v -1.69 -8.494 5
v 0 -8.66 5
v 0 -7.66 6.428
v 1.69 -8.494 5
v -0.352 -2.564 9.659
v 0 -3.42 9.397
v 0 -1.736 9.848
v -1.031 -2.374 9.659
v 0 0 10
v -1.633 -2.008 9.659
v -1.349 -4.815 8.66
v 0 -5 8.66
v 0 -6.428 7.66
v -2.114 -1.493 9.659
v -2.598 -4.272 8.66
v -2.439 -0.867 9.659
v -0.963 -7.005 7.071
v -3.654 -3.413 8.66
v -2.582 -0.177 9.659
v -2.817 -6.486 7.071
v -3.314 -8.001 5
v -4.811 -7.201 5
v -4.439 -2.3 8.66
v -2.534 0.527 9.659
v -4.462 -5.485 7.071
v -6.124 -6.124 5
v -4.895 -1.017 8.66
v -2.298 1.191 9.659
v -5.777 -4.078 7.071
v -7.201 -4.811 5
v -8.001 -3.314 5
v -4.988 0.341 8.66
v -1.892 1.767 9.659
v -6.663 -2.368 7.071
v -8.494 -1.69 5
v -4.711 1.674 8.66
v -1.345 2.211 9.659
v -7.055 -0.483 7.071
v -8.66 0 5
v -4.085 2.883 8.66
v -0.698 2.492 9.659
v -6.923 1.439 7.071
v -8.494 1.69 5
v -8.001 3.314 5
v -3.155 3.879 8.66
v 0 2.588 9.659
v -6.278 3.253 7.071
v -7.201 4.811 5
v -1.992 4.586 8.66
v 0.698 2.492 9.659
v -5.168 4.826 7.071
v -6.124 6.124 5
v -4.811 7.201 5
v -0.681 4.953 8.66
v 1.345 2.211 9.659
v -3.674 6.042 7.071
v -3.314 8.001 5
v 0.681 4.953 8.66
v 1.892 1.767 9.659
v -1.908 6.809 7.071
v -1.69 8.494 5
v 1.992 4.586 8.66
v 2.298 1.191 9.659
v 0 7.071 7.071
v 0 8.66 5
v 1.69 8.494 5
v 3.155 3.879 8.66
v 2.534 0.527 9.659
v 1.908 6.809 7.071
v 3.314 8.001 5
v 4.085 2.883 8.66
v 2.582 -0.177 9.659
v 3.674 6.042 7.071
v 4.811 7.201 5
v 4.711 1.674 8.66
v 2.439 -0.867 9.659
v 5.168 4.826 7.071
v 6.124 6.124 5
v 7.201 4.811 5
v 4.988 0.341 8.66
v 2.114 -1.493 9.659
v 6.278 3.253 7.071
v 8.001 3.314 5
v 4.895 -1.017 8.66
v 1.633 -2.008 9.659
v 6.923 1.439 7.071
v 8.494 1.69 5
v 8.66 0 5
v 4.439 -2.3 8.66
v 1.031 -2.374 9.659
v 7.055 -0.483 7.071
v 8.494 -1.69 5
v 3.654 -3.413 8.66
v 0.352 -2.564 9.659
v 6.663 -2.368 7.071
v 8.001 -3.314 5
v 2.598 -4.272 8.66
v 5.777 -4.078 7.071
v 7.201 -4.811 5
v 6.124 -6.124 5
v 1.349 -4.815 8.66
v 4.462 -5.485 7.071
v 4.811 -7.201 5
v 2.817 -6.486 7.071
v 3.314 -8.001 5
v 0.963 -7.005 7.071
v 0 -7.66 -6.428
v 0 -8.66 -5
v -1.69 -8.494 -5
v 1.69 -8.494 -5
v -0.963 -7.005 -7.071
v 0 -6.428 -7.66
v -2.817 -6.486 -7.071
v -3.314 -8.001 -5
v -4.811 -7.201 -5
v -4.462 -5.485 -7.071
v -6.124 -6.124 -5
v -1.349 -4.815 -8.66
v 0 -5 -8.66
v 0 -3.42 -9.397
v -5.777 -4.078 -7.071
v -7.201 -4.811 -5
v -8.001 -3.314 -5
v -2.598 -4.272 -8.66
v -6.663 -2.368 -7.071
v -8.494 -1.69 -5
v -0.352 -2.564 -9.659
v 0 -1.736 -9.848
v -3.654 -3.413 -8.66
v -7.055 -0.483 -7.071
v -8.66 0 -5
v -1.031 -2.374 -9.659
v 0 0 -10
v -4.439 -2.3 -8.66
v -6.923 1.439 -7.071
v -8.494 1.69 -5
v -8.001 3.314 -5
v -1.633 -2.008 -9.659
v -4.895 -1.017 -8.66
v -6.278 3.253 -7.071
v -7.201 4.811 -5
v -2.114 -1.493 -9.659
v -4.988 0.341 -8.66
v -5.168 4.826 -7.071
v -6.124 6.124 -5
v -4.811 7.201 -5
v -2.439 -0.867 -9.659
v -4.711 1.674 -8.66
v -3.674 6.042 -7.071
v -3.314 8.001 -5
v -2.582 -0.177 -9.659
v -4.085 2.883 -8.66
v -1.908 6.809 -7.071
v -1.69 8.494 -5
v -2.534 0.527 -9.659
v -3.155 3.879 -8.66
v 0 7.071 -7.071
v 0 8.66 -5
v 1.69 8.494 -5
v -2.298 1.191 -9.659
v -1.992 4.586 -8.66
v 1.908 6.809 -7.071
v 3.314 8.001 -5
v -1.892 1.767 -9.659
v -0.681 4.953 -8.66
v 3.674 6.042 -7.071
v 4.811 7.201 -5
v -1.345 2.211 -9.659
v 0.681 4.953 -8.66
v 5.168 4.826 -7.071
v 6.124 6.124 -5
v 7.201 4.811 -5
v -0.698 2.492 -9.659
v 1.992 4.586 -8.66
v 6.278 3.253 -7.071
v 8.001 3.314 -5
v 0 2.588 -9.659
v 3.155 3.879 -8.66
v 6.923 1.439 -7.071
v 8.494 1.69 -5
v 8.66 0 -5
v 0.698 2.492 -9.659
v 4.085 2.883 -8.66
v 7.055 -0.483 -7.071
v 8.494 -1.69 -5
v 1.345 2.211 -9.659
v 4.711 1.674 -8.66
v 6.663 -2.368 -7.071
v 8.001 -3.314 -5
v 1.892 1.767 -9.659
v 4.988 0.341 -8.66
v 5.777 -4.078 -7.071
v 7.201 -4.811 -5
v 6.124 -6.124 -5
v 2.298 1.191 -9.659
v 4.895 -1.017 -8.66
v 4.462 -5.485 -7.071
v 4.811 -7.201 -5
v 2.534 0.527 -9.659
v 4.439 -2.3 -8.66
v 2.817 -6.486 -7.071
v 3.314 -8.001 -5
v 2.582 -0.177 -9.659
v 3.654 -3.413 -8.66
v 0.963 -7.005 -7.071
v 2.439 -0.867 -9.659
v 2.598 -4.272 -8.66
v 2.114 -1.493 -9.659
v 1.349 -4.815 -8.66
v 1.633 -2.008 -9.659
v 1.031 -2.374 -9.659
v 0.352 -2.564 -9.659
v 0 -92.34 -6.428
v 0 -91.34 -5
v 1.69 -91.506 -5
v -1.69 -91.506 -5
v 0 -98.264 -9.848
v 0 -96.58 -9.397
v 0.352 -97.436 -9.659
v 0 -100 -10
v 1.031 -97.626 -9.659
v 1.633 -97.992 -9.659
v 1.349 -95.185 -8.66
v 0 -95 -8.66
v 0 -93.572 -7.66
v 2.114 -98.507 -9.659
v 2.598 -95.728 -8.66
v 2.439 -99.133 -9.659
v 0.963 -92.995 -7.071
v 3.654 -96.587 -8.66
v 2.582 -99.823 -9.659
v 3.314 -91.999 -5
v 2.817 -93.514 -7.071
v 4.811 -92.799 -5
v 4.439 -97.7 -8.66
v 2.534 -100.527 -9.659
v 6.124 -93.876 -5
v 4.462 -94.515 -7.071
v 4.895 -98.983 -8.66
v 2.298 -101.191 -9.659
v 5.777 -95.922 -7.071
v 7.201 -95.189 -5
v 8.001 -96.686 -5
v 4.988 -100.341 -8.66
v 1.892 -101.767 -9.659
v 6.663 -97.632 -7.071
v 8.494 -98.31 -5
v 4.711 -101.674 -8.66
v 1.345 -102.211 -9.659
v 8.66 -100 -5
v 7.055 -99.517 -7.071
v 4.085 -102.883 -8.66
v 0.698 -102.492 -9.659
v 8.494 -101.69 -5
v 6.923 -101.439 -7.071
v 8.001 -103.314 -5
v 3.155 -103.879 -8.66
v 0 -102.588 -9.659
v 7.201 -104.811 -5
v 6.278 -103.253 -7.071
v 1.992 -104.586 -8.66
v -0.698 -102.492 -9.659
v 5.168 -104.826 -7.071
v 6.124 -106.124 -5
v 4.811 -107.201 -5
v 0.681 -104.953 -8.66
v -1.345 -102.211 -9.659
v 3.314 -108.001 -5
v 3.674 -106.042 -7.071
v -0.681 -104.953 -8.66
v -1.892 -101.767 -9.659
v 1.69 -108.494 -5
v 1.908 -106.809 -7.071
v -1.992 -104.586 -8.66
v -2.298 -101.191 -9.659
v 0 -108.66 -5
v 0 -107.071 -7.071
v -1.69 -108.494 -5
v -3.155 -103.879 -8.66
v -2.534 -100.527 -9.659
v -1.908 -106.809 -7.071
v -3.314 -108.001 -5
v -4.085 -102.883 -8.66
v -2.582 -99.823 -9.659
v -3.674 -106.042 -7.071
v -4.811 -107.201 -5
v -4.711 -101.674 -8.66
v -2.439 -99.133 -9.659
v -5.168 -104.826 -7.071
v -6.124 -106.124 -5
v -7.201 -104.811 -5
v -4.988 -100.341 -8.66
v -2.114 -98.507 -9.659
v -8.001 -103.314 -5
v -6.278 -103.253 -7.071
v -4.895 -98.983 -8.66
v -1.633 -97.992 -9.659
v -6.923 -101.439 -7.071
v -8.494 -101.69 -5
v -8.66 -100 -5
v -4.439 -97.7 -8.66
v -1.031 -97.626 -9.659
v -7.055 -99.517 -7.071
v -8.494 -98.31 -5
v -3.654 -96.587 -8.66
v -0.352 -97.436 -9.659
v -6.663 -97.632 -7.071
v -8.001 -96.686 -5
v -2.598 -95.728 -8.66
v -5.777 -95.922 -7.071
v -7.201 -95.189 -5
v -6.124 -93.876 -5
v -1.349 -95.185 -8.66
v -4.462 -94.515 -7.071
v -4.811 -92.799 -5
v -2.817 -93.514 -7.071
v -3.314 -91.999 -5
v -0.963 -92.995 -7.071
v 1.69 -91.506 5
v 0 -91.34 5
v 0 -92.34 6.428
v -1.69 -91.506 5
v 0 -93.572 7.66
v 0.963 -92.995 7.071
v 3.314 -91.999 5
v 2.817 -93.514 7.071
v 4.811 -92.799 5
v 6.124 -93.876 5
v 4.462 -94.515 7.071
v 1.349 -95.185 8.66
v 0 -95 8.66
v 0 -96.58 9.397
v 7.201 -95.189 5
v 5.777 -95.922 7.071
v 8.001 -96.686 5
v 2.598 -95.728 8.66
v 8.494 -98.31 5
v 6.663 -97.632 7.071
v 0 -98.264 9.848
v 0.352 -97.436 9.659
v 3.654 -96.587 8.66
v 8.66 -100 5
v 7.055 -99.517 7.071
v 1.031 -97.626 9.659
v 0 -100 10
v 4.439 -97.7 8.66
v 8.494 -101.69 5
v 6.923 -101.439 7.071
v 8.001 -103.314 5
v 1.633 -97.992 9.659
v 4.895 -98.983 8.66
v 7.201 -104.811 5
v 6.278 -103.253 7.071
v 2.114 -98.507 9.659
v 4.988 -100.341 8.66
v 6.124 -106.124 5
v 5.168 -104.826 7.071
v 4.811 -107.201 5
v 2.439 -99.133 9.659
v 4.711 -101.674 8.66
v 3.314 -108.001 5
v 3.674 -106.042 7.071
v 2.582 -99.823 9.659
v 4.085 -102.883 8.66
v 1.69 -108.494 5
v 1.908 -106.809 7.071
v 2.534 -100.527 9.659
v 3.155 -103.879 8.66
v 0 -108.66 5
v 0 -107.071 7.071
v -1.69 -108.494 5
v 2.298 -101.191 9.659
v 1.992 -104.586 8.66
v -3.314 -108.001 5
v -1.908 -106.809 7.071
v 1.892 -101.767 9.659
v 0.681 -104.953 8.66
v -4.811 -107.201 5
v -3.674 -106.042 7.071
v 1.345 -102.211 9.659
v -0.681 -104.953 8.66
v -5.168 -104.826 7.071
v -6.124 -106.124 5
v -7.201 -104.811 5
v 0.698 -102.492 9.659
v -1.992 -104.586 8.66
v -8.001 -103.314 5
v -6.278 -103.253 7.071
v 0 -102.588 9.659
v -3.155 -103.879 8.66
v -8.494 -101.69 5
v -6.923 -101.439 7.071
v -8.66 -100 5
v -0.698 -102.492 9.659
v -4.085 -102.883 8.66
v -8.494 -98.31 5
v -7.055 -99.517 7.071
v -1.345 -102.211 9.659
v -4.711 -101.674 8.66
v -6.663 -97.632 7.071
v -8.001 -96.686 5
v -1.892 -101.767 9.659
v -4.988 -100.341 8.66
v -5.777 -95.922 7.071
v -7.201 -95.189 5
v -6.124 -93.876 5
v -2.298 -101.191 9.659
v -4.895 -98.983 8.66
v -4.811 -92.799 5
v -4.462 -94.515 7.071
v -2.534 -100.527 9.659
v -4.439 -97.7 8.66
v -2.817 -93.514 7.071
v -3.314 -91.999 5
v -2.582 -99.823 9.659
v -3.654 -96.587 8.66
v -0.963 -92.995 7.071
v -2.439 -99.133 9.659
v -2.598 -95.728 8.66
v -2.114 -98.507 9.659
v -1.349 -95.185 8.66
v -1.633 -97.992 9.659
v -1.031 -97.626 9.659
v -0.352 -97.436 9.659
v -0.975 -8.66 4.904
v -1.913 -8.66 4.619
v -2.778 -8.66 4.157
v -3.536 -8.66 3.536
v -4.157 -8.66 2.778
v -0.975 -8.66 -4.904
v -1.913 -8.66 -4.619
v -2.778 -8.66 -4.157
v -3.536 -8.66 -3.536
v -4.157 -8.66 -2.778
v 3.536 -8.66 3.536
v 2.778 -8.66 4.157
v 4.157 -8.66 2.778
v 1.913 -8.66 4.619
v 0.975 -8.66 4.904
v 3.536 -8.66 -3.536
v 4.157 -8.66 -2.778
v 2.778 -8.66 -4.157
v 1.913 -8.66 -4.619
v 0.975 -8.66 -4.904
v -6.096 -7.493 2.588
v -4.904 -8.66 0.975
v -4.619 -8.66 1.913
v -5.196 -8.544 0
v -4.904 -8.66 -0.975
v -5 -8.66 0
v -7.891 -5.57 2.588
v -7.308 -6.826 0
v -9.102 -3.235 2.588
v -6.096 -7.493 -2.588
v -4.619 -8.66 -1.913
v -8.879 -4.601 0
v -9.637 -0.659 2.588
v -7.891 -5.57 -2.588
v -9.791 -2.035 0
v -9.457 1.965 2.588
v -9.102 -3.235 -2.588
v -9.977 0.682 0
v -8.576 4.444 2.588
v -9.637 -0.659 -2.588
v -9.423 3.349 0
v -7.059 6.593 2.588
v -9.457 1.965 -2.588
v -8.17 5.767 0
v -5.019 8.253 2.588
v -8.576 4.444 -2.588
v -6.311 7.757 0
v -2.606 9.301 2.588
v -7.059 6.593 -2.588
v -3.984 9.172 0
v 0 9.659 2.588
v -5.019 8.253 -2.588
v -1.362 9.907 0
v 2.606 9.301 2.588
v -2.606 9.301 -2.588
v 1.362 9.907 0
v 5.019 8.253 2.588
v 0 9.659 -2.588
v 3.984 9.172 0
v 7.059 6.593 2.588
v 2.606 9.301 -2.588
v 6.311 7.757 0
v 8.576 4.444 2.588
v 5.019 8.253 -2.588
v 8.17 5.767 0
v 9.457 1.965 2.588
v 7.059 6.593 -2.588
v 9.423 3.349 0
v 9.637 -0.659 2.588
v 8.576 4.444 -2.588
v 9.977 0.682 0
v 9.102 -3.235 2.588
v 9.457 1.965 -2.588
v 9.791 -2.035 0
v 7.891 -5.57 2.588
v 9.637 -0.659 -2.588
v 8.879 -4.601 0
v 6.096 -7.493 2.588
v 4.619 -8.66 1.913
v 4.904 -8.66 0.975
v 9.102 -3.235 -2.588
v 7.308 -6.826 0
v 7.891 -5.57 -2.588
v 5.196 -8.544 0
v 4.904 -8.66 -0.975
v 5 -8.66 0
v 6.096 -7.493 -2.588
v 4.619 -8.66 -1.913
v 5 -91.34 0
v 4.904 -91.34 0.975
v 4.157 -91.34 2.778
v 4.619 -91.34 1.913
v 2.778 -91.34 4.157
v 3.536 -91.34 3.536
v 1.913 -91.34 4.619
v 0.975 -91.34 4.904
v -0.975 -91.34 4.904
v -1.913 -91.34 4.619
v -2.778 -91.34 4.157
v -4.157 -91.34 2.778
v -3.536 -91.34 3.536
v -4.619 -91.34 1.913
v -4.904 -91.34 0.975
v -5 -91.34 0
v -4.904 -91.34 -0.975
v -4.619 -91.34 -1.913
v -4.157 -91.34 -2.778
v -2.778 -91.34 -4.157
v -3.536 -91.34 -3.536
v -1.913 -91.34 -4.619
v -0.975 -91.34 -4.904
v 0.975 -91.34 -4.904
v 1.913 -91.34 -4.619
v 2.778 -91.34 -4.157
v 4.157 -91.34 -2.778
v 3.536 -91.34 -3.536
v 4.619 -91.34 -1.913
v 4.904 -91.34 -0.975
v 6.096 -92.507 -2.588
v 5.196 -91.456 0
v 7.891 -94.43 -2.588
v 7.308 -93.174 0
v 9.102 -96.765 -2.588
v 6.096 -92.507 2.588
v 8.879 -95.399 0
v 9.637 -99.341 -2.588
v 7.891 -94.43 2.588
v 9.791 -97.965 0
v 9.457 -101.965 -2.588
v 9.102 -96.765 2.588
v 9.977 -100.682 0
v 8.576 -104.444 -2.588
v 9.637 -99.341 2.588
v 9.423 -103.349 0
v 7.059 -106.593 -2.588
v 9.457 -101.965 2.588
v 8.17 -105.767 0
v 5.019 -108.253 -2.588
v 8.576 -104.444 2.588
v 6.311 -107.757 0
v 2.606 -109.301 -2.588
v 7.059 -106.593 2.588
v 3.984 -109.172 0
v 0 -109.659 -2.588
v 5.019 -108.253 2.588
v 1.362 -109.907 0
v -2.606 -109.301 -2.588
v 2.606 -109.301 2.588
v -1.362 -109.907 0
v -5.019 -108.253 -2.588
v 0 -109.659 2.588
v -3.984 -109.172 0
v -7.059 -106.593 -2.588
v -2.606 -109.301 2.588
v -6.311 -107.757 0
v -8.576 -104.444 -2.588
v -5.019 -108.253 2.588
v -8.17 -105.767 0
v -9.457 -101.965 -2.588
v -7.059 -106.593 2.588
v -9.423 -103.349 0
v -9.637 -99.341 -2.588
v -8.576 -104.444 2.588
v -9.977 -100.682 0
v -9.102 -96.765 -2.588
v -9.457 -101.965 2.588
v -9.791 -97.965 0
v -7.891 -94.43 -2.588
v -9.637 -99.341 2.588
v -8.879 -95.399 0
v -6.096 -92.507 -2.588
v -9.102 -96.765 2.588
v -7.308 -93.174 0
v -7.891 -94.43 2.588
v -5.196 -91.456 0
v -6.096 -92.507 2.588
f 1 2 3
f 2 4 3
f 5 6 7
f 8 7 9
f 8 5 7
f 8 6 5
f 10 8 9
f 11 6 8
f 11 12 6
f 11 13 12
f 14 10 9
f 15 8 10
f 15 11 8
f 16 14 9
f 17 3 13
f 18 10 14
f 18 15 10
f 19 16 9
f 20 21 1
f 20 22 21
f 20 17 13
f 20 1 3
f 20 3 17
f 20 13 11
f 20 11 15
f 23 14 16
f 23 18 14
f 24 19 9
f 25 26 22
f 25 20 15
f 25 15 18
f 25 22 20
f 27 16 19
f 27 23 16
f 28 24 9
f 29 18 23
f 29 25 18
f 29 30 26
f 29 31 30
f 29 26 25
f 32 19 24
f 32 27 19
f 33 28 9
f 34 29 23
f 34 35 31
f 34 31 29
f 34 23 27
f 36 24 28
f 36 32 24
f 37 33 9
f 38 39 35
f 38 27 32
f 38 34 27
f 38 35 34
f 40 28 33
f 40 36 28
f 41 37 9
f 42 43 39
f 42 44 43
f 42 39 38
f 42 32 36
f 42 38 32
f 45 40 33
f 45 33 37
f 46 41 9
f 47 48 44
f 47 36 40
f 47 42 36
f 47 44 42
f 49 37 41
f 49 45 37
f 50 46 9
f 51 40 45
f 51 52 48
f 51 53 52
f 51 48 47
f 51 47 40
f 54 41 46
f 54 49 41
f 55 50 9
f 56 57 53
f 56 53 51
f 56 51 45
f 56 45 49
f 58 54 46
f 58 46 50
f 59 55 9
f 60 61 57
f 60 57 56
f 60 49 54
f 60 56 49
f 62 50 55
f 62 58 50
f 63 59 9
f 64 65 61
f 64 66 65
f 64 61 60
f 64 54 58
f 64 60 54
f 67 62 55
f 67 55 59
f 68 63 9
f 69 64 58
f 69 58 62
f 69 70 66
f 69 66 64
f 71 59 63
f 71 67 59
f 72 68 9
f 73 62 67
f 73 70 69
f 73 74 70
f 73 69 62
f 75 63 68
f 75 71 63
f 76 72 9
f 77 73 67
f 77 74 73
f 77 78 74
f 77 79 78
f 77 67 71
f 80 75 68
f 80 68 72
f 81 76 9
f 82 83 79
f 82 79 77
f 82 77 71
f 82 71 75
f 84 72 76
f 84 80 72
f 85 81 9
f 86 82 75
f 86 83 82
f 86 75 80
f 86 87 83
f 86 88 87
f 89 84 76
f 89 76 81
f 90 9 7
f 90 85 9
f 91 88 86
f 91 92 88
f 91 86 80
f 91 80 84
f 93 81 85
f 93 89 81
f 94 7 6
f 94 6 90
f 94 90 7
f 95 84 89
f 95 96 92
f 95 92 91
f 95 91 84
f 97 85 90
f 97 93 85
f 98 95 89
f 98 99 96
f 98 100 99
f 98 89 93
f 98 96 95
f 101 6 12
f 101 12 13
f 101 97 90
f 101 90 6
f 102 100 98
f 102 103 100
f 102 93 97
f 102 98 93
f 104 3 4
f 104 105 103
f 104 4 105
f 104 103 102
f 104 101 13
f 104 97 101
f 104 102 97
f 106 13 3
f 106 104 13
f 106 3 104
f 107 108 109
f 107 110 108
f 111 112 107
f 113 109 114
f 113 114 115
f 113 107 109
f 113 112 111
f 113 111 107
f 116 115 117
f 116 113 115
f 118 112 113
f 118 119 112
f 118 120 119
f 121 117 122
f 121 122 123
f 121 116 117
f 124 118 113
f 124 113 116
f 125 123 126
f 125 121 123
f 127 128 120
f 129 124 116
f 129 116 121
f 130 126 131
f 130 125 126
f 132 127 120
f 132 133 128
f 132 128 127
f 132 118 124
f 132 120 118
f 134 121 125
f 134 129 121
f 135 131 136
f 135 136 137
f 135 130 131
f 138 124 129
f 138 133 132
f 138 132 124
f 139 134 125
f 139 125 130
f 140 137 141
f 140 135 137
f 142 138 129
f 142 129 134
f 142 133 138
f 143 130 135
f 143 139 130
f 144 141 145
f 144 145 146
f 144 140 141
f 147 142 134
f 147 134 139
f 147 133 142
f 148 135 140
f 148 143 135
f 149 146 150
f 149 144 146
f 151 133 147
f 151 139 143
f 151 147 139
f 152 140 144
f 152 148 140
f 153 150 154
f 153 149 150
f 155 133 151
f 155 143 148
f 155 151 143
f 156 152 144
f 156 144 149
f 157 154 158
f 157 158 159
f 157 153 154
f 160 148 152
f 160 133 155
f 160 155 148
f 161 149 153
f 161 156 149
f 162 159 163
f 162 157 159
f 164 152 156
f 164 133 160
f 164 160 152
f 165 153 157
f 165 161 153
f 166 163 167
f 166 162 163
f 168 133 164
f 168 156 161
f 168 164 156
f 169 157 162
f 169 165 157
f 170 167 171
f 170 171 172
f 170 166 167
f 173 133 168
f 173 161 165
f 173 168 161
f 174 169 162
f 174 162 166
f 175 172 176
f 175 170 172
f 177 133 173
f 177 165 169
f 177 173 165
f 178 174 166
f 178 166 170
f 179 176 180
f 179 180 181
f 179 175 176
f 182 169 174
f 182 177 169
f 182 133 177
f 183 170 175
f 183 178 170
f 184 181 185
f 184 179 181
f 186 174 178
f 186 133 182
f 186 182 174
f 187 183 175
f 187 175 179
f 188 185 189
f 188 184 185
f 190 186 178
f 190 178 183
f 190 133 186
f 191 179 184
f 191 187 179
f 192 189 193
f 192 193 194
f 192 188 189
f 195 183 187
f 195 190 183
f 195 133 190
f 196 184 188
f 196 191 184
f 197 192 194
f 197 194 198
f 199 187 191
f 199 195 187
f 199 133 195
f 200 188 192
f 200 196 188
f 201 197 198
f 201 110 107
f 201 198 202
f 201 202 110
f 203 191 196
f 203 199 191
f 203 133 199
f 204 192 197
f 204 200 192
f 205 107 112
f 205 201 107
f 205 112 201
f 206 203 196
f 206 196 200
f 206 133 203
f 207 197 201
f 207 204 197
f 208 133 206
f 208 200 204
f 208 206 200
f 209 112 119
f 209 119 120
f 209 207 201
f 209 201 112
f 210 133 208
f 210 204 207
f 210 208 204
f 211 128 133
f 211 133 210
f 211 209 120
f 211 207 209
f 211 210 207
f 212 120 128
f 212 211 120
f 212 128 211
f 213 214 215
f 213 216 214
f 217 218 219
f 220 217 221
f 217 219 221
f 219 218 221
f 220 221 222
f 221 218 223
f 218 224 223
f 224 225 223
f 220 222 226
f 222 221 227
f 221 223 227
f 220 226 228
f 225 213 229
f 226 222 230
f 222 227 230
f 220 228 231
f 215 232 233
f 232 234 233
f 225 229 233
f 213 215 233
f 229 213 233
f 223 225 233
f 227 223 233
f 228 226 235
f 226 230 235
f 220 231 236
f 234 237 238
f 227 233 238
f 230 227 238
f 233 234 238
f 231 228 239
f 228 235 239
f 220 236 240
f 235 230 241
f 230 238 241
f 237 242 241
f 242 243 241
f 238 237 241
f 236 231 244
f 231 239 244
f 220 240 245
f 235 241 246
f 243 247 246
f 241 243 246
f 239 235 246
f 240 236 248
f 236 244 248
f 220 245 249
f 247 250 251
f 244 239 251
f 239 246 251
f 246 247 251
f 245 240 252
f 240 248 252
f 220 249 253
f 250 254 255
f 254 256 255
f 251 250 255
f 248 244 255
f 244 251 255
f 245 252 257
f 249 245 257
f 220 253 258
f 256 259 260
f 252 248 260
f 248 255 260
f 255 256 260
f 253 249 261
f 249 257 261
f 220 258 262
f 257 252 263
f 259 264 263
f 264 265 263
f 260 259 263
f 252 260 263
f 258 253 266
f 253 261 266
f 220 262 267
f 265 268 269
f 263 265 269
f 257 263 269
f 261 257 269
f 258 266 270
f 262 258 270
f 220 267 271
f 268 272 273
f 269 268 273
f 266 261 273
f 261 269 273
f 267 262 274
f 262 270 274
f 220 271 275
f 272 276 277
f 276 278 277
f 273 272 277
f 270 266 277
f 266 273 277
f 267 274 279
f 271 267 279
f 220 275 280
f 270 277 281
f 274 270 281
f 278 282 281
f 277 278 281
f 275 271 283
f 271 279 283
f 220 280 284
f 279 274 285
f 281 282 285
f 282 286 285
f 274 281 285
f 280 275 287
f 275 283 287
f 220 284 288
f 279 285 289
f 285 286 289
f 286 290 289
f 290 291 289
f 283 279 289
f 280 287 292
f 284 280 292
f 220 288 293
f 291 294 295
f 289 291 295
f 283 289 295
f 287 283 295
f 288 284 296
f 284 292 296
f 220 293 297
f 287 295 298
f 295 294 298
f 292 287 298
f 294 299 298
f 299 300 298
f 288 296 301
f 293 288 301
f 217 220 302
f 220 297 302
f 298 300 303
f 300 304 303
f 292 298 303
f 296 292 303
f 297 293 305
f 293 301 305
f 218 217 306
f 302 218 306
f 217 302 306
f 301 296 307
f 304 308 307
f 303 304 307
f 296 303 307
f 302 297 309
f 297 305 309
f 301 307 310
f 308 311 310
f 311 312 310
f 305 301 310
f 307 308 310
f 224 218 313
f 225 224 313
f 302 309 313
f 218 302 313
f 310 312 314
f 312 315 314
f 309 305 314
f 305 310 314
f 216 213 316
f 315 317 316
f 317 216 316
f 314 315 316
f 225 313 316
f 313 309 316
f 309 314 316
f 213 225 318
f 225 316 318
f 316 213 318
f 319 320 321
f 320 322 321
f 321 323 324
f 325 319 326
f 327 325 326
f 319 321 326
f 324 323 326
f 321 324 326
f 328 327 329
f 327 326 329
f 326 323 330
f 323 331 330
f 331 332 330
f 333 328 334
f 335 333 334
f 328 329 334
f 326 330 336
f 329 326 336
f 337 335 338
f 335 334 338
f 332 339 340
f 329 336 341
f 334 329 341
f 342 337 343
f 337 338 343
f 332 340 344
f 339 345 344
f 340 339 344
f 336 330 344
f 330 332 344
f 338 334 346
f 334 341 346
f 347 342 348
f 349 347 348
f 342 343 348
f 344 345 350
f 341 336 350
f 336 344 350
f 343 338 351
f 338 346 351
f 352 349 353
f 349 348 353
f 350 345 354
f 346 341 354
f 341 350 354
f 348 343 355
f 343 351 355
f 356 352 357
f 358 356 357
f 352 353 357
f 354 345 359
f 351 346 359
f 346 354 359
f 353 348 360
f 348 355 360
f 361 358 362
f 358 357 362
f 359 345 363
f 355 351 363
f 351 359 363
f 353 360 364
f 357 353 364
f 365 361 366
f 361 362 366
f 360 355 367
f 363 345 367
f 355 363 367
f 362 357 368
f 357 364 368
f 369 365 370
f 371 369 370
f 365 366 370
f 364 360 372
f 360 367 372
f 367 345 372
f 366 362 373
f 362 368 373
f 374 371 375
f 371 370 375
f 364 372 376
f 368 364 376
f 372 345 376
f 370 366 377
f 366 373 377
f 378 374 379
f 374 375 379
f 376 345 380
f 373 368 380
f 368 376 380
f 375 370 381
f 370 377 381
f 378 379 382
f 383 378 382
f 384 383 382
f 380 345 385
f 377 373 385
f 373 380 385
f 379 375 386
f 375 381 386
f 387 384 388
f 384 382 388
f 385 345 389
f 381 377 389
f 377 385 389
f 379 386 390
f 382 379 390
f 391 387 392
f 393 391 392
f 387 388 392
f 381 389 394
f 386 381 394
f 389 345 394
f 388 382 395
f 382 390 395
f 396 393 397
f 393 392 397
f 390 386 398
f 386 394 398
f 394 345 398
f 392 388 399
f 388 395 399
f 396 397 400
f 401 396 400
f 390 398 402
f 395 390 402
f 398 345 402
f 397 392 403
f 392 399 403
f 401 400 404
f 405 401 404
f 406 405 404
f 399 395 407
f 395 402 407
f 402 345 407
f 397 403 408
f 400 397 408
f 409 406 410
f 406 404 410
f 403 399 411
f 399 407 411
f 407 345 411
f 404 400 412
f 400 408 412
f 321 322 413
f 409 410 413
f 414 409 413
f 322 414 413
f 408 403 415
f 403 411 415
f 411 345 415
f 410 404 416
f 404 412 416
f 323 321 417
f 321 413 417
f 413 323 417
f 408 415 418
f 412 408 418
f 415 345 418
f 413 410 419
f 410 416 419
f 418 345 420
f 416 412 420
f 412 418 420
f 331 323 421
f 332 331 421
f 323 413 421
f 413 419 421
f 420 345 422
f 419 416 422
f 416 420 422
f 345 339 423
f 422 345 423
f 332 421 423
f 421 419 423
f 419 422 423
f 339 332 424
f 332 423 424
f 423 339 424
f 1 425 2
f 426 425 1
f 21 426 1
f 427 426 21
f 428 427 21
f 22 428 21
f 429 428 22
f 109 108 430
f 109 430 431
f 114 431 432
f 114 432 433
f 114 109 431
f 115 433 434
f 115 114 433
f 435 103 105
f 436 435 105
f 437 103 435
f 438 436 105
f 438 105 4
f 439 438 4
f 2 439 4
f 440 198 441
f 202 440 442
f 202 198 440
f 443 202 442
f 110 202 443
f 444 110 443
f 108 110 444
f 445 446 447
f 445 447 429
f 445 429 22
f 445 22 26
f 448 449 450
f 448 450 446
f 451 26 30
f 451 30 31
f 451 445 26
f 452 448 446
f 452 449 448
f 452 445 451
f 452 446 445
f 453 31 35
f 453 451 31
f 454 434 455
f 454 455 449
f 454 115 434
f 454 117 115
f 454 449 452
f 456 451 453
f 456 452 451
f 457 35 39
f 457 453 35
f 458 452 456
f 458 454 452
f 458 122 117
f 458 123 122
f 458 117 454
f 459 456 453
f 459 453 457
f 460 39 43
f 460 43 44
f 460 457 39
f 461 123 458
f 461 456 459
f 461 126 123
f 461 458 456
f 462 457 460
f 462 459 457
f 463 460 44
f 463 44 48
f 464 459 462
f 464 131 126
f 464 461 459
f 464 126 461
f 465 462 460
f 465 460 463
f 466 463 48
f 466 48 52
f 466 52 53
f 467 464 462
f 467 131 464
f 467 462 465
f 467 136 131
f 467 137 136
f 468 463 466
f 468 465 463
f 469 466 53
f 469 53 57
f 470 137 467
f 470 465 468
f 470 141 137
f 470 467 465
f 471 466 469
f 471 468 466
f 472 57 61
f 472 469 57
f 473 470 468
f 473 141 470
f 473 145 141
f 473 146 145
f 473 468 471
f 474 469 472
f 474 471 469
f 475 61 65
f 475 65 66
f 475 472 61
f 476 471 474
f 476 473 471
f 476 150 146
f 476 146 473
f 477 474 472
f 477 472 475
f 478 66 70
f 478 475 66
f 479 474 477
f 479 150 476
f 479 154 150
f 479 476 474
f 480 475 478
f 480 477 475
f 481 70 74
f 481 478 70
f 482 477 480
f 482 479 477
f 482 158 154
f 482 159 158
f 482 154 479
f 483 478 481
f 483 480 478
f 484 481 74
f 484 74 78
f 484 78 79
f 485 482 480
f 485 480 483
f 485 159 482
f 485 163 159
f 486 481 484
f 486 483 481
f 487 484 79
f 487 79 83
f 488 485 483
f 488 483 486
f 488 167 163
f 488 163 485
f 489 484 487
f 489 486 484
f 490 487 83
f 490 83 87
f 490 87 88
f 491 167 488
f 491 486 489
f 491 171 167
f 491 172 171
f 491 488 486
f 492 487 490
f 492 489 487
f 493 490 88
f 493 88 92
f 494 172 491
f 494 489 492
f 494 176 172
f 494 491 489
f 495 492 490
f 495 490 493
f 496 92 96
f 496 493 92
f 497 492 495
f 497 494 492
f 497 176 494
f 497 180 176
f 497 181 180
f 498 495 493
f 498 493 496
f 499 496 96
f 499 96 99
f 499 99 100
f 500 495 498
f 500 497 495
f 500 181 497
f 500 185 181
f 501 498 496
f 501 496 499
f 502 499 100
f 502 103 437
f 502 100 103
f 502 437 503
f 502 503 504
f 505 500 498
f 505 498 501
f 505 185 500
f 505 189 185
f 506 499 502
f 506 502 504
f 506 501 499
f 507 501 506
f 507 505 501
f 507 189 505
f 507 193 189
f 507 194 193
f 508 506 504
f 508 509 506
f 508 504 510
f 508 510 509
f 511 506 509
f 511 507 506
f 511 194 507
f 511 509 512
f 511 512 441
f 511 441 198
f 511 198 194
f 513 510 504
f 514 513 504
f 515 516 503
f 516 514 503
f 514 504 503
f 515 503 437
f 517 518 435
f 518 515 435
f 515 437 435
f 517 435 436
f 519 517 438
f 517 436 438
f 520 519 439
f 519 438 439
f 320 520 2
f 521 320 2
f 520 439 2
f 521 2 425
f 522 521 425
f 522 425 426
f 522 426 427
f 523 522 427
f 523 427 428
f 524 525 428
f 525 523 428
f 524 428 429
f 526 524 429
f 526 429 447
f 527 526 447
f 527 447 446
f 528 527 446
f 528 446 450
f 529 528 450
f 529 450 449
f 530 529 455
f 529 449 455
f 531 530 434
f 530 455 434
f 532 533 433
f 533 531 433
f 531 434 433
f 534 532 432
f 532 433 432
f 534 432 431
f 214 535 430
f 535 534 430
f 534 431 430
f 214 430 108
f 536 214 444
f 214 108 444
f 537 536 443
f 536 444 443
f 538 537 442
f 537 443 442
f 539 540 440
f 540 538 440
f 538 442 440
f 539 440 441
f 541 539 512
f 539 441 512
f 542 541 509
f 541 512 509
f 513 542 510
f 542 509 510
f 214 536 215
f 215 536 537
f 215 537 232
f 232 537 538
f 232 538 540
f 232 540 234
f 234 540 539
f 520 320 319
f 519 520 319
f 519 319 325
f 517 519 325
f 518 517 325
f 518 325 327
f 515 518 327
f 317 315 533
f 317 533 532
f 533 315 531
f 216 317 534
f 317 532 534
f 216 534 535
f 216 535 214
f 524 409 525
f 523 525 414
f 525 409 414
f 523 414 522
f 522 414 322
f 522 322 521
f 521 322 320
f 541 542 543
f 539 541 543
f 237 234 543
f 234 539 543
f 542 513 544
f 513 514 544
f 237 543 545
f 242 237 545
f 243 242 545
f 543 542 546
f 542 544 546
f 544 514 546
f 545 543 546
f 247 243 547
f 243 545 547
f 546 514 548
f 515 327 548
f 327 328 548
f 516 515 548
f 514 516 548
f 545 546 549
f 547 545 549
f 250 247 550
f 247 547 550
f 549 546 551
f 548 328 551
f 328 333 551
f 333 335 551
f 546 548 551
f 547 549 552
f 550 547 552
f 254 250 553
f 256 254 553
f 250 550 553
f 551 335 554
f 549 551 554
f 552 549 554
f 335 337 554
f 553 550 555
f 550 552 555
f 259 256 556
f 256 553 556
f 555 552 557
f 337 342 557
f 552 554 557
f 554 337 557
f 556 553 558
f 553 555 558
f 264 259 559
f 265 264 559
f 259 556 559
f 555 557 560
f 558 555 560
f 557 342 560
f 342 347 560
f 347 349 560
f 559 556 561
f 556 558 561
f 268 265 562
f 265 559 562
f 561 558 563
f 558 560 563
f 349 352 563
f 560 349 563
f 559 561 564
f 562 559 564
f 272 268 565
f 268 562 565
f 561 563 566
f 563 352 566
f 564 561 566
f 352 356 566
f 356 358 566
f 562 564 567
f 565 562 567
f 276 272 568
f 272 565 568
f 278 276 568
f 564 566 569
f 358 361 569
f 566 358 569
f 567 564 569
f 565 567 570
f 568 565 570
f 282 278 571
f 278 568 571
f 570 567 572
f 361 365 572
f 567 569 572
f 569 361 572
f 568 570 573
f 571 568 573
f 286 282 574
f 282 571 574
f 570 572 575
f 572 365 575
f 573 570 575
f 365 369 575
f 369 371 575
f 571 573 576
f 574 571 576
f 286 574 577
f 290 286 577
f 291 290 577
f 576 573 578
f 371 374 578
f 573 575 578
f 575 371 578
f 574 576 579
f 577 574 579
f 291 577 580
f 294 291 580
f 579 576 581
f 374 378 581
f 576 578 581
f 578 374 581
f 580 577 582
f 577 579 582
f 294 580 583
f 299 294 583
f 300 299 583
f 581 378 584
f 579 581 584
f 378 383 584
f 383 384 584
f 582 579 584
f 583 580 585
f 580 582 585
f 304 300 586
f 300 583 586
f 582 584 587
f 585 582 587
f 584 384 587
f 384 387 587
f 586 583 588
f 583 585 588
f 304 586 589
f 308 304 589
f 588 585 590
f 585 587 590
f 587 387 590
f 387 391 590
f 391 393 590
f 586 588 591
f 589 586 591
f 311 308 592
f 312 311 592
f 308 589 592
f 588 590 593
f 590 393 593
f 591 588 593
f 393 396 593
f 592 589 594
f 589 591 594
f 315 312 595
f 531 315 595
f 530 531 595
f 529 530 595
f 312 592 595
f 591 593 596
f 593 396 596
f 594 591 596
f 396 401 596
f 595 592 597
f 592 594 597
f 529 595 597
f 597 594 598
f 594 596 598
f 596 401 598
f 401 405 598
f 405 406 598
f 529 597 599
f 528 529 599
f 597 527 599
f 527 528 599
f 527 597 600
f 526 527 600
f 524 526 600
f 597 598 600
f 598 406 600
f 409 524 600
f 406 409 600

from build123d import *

# Parameters (mm, degrees)
F0_R     = 5
F1_DEPTH = 100


with BuildPart() as f1:
    # F0 (on Front) → F1 (new body)
    with BuildSketch(Plane.XZ):
        Circle(F0_R)
    extrude(amount=F1_DEPTH)

    # F2 (on Right) → F3 (revolve)
    with BuildSketch(Plane.YZ):
        with BuildLine():
            Line((0, -10), (0, 10))
            ThreePointArc((0, 10), (-5, 8.6602540378), (-8.6602540378, 5))
            ThreePointArc((-8.6602540378, 5), (-10, 0), (-8.6602540378, -5))
            ThreePointArc((-8.6602540378, -5), (-5, -8.6602540378), (0, -10))
        make_face()
    revolve(axis=Axis((0, 0, 0), (0, 0, -1)))

    # F2 (on Right) → F4 (revolve)
    with BuildSketch(Plane.YZ):
        with BuildLine():
            ThreePointArc((-91.3397459622, -5), (-90, 0), (-91.3397459622, 5))
            ThreePointArc((-91.3397459622, 5), (-95, 8.6602540378), (-100, 10))
            Line((-100, 10), (-100, -10))
            ThreePointArc((-100, -10), (-95, -8.6602540378), (-91.3397459622, -5))
        make_face()
    revolve(axis=Axis((0, -100, 0), (0, 0, -1)))


solid = f1.part
